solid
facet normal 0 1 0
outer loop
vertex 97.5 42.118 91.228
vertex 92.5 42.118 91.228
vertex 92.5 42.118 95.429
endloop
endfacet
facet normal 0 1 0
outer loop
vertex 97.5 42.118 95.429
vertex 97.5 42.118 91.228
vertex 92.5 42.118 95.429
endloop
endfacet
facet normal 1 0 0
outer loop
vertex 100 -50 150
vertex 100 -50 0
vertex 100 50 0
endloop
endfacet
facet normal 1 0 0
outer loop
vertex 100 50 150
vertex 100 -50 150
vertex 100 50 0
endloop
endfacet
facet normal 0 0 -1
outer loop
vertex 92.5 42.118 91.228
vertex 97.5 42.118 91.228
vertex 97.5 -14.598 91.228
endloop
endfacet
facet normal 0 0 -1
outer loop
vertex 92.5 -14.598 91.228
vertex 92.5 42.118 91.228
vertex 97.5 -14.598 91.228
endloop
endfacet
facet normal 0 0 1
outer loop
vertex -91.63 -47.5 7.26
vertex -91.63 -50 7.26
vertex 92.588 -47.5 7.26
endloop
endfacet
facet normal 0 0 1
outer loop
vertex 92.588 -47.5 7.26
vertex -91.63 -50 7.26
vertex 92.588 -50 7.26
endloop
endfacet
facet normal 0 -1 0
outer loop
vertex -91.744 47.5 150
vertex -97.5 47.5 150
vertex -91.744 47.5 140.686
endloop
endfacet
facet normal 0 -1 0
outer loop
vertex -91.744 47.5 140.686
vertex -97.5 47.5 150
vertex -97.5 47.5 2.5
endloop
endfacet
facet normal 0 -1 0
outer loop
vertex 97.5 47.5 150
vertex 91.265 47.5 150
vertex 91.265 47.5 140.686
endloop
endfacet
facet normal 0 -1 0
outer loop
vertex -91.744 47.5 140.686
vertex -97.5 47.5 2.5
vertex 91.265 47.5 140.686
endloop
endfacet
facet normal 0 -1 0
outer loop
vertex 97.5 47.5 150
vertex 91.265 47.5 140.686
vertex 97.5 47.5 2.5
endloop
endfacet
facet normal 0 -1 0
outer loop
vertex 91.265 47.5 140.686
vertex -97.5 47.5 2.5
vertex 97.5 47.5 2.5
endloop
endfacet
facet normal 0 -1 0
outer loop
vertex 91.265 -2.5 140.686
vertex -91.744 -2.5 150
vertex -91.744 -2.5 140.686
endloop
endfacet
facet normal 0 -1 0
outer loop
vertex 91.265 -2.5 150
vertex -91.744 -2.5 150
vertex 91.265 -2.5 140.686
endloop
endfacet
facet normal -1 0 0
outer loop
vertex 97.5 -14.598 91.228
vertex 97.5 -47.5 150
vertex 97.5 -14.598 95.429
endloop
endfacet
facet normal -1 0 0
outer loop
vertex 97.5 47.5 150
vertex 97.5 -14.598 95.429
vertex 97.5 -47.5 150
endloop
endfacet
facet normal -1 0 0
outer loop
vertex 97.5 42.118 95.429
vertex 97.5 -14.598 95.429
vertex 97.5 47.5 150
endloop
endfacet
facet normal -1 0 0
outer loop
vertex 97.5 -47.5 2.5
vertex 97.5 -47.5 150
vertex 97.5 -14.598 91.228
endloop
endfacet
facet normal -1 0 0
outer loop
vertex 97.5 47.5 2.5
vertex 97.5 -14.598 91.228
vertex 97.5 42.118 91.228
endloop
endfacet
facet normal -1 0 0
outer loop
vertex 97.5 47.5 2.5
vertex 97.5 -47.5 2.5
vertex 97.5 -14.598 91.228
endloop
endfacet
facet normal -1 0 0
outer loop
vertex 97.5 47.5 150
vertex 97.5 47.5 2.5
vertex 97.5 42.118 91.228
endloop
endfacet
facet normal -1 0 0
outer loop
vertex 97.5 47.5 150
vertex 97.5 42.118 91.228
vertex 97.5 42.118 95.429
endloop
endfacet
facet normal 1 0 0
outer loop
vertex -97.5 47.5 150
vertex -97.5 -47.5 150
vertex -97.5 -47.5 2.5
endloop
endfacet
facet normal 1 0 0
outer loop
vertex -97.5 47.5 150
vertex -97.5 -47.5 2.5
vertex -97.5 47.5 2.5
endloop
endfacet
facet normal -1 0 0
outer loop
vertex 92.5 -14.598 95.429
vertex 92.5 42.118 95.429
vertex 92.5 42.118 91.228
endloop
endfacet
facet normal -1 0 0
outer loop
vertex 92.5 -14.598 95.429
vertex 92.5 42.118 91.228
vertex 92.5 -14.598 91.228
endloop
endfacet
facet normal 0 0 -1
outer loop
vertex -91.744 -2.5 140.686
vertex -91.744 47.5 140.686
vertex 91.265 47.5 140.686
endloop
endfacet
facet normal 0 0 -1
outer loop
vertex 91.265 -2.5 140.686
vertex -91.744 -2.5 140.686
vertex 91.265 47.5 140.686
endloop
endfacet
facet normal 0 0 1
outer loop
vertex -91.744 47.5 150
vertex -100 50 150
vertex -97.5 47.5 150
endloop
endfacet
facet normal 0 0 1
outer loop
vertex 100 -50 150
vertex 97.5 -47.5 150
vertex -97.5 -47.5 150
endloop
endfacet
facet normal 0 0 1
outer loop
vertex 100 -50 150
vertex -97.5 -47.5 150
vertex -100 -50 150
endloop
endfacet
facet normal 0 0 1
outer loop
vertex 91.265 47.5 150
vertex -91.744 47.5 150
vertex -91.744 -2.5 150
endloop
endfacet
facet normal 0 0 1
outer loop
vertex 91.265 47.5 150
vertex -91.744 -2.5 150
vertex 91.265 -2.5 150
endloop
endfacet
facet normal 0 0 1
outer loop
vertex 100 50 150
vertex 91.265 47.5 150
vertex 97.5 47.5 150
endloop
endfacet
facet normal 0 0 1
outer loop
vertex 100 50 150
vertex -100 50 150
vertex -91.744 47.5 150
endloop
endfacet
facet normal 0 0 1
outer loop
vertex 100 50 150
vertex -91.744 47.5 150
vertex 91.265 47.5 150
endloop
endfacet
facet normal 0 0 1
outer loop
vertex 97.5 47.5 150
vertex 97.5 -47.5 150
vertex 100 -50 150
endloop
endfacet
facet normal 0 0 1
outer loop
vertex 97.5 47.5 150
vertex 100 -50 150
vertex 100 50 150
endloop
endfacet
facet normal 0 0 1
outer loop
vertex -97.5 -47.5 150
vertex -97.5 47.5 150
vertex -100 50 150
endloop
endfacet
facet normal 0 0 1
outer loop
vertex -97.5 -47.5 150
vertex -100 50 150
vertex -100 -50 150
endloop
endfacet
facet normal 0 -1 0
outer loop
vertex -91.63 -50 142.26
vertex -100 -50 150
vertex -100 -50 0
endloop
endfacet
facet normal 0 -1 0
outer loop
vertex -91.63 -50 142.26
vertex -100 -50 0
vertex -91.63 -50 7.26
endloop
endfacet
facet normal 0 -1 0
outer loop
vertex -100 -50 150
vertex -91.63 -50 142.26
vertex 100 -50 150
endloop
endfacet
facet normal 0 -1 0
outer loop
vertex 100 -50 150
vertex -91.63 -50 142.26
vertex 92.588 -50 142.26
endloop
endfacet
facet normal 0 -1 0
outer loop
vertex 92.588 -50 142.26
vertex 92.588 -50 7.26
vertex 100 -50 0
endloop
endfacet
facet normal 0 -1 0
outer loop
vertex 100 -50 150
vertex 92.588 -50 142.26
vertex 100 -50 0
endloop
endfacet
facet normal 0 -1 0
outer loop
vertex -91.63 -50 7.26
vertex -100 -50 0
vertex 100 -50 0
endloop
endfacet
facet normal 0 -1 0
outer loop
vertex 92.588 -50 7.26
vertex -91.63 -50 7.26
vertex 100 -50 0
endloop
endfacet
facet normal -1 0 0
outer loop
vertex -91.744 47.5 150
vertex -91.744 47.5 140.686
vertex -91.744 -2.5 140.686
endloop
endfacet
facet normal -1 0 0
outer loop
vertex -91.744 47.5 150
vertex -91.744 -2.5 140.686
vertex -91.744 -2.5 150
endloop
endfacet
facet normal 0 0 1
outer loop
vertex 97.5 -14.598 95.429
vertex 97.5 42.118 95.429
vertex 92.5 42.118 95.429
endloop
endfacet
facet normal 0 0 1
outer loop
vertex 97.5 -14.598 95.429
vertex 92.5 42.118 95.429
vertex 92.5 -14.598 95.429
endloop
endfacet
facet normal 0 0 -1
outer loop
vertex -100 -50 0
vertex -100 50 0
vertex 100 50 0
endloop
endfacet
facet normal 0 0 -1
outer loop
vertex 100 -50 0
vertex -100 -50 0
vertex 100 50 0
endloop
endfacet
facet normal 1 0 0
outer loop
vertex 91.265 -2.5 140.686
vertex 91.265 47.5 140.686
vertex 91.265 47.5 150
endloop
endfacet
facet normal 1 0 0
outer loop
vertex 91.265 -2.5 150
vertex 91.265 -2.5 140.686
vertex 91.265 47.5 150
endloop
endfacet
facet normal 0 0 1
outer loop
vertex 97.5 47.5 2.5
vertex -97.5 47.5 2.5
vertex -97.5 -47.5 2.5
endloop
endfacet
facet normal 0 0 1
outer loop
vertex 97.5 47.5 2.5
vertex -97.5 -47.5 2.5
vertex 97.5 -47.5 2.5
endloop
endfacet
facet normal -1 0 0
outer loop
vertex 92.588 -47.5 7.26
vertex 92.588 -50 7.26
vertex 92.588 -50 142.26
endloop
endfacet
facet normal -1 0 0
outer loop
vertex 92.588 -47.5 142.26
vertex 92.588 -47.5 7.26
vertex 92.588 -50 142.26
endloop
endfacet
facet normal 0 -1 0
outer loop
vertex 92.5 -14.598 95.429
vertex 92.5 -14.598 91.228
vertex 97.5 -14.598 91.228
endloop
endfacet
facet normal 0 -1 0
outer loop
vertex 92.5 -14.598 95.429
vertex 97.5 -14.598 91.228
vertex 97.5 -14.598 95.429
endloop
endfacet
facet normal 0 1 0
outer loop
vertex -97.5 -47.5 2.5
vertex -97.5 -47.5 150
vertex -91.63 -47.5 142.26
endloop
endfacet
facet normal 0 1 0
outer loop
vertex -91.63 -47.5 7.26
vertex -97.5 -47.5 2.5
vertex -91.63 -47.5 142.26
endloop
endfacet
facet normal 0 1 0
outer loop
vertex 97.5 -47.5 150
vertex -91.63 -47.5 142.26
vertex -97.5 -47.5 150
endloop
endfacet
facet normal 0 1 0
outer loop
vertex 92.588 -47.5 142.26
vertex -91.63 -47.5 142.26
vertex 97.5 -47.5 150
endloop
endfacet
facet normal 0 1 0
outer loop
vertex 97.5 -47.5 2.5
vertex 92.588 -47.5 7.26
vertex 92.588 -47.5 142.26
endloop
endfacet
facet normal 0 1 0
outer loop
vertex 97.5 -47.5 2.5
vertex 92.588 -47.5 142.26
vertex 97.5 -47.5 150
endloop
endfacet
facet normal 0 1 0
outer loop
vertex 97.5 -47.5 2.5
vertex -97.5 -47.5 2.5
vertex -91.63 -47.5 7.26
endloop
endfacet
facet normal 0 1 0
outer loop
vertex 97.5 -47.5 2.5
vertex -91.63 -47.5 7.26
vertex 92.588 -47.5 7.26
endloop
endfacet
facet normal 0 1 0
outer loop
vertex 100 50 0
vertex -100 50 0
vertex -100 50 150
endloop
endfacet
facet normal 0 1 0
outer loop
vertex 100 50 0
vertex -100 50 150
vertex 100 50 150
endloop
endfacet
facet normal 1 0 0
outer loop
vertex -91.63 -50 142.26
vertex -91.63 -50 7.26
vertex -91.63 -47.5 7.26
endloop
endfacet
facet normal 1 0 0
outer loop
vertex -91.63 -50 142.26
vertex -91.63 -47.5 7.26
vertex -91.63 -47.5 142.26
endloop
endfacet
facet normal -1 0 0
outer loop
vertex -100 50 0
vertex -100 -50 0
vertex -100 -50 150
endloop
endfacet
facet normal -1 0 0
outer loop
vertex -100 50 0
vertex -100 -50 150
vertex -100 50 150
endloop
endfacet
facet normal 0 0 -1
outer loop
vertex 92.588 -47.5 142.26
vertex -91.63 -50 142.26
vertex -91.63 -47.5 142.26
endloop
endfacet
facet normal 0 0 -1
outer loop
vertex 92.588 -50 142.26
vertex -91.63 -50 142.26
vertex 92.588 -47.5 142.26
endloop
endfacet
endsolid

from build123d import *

# Parameters (mm, degrees)
F0_W     = 200
F0_H     = 100
F1_DEPTH = 150
F2_T     = -2.5
F3_W     = 184.218731
F3_H     = 135
F4_DEPTH = 25
F5_W     = 56.715606
F5_H     = 4.201159
F6_DEPTH = 5
F7_W     = 183.008641
F7_H     = 9.313712
F8_DEPTH = 50


with BuildPart() as f1:
    # F0 (on Top) → F1 (new body)
    with BuildSketch(Plane.XY):
        Rectangle(F0_W, F0_H)
    extrude(amount=F1_DEPTH)

    # F2
    f2_openings = [f1.faces().sort_by_distance(p)[0] for p in [
        (0, 0, 150),
    ]]
    offset(amount=F2_T, openings=f2_openings)

    # F3 (on face) → F4 (cut)
    with BuildSketch(Plane.XZ.offset(50)):
        with Locations((0.479073, 74.760462)):
            Rectangle(F3_W, F3_H)
    extrude(amount=-F4_DEPTH, mode=Mode.SUBTRACT)

    # F5 (on face) → F6 (join)
    with BuildSketch(Plane(origin=(97.5, 0, 0), x_dir=(0, -1, 0), z_dir=(-1, 0, 0))):
        with Locations((-13.760083, 93.328818)):
            Rectangle(F5_W, F5_H)
    extrude(amount=F6_DEPTH)

    # F7 (on face) → F8 (join)
    with BuildSketch(Plane.XZ.offset(-47.5)):
        with Locations((-0.239544, 145.343144)):
            Rectangle(F7_W, F7_H)
    extrude(amount=F8_DEPTH)


solid = f1.part
